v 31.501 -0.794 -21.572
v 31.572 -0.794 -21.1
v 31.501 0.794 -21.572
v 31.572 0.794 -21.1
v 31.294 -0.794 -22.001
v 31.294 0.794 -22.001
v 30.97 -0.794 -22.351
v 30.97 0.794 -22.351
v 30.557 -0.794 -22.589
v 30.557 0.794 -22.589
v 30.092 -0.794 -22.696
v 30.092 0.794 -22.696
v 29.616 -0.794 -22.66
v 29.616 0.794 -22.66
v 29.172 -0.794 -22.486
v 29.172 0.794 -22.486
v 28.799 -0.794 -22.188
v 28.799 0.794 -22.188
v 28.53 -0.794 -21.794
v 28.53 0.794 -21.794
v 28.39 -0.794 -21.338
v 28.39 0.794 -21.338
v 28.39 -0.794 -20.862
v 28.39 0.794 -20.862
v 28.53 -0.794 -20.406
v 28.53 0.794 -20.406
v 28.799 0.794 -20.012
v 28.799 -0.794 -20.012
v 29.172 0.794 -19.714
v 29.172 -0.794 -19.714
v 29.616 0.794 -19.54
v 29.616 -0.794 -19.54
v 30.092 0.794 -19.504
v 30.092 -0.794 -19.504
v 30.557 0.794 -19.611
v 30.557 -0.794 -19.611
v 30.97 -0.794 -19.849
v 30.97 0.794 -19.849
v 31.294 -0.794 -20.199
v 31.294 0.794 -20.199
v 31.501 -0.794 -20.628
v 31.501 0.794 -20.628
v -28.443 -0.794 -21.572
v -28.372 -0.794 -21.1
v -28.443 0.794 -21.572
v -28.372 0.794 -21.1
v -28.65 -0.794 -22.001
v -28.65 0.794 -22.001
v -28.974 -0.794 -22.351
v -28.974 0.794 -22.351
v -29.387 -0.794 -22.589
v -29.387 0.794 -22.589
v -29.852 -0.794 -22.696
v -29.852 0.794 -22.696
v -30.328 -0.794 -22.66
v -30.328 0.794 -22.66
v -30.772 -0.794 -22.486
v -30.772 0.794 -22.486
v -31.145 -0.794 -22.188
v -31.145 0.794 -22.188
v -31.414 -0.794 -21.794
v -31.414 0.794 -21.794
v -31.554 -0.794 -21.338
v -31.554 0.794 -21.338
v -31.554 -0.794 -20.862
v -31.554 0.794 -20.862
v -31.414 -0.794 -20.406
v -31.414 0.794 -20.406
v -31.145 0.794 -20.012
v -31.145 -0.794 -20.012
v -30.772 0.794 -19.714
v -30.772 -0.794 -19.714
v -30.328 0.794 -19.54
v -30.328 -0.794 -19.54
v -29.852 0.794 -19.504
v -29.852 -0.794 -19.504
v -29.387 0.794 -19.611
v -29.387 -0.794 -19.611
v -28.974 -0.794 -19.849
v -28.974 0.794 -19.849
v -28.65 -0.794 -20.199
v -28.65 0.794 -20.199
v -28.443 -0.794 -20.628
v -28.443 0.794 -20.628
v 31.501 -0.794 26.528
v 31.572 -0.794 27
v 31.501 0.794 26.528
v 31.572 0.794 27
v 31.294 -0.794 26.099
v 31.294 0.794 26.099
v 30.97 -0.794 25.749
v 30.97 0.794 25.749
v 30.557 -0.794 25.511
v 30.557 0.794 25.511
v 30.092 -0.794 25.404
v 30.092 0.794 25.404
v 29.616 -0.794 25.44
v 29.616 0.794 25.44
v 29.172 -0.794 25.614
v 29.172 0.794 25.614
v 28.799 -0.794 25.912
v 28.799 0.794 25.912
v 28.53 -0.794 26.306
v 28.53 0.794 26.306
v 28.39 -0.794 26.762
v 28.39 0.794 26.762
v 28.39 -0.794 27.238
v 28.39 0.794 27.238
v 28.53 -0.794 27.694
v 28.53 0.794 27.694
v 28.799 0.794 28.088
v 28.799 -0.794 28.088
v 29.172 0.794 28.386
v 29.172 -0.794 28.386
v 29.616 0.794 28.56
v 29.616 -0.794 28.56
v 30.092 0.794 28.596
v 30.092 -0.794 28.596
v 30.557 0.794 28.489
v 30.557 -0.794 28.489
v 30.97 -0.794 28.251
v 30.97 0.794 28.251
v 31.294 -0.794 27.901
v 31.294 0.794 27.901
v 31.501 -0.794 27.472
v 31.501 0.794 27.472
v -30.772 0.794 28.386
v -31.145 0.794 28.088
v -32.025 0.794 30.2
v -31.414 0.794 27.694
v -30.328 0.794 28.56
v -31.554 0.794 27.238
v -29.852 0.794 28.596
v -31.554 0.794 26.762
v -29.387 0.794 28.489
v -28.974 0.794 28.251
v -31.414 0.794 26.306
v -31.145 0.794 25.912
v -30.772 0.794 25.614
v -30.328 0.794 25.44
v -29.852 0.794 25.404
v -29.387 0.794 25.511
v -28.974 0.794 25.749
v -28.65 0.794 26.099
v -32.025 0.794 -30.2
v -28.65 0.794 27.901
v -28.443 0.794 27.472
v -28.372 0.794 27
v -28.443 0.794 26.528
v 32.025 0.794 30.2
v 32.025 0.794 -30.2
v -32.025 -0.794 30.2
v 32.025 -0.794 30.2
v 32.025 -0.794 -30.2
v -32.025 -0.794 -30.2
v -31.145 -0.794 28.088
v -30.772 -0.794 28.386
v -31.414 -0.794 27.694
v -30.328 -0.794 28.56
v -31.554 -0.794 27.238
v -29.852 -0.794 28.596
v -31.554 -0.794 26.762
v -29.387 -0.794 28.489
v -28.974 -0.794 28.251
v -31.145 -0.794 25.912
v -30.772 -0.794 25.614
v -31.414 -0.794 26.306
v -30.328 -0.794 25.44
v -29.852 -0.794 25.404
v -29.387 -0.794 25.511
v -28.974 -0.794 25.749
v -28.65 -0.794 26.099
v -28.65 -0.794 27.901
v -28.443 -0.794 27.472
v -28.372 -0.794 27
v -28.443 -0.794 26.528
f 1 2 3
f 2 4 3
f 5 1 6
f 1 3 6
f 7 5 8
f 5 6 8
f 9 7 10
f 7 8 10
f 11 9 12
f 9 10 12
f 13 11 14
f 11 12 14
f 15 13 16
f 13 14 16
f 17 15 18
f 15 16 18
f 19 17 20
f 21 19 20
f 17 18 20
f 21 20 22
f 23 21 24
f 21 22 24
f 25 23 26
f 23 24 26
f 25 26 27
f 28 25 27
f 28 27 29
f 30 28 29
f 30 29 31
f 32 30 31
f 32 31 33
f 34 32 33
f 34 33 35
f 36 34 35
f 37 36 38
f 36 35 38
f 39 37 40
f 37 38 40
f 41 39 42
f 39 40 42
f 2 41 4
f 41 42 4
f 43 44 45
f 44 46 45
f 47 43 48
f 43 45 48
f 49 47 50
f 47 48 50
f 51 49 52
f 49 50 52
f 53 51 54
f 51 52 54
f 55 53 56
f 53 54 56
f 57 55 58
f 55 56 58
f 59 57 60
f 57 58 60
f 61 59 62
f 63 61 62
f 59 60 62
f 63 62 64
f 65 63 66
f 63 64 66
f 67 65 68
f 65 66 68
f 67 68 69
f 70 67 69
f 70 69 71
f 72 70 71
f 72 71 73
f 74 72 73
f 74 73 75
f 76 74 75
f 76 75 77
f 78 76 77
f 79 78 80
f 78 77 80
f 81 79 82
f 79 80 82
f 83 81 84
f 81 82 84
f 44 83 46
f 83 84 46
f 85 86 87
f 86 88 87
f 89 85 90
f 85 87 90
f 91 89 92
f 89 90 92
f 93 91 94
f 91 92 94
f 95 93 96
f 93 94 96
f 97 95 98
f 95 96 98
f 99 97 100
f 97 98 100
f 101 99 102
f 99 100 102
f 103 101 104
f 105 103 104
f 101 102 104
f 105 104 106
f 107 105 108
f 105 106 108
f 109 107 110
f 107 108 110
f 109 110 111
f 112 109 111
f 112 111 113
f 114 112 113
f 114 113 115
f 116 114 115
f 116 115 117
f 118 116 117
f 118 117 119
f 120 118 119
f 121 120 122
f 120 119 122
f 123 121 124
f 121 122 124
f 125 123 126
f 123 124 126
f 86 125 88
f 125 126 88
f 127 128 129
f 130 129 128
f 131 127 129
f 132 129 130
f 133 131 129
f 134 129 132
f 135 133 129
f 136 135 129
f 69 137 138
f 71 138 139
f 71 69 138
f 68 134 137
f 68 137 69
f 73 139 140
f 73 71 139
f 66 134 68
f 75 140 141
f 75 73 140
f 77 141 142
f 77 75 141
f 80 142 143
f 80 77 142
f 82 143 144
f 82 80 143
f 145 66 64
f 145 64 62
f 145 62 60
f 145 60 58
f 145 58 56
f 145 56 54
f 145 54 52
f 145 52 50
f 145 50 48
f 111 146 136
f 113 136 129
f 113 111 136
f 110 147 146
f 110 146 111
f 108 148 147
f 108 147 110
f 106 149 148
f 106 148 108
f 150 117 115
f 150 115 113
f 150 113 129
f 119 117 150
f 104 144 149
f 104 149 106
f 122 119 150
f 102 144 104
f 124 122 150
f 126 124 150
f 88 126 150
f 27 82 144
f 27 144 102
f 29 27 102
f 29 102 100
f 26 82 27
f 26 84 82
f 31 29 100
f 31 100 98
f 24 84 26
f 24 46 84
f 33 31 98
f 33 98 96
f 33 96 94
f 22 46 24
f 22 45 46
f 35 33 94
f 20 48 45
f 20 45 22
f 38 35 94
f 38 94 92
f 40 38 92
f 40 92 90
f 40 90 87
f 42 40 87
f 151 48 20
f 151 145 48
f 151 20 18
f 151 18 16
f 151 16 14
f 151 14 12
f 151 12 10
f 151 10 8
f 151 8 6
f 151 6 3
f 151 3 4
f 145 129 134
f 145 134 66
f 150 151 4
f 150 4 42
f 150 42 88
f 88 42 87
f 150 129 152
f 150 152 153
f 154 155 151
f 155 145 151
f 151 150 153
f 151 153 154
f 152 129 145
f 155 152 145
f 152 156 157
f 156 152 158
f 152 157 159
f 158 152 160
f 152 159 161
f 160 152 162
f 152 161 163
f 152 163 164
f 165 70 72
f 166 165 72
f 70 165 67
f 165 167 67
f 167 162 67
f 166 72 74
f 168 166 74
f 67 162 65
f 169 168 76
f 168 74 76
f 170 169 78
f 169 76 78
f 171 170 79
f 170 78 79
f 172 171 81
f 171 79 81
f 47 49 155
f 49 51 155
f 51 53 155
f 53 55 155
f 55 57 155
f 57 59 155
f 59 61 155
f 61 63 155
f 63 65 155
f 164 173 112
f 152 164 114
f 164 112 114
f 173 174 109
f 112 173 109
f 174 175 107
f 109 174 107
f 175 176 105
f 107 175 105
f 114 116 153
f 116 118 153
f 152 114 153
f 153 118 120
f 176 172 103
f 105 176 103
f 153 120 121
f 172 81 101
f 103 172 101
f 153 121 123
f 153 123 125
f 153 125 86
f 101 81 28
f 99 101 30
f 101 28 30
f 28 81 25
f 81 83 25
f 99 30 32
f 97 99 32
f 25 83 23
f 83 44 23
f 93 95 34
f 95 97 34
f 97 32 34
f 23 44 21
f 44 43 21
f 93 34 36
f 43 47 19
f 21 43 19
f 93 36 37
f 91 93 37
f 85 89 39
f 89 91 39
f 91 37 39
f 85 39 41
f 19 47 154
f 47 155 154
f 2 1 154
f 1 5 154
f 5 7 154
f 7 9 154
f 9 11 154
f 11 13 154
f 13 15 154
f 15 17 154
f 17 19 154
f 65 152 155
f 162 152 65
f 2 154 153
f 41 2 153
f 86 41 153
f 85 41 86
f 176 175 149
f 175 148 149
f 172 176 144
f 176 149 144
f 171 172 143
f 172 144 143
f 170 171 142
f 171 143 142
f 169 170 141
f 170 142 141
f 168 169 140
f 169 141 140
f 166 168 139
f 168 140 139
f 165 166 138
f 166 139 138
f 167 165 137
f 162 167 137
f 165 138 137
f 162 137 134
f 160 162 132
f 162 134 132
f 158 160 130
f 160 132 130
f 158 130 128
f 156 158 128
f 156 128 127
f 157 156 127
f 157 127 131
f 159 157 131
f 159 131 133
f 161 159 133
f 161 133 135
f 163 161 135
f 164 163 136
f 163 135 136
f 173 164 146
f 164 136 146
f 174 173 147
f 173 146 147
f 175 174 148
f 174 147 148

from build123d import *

# Parameters (mm, degrees)
SKETCH2_W               = 64.049999916
SKETCH2_H               = 60.400000104
BOSS_EXTRUDE1_DEPTH     = 0.79375
SKETCH3_R               = 1.599999975
CUT_EXTRUDE1_DEPTH      = 1.79375
CUT_EXTRUDE1_DEPTH_BACK = 1.79375


with BuildPart() as part:
    # Sketch2 → Boss-Extrude1 (new body, symmetric)
    with BuildSketch(Plane(origin=(0, 0, 0), x_dir=(1, 0, 0), z_dir=(0, 1, 0))):
        Rectangle(SKETCH2_W, SKETCH2_H)
    extrude(amount=BOSS_EXTRUDE1_DEPTH, both=True)

    # Sketch3 → Cut-Extrude1 (cut, two sides)
    with BuildSketch(Plane(origin=(0, 0, 0), x_dir=(1, 0, 0), z_dir=(0, 1, 0))) as cut_extrude1_sk:
        with Locations((-29.972, 21.099999964)):
            Circle(SKETCH3_R)
        with Locations((29.972, 21.099999964)):
            Circle(SKETCH3_R)
        with Locations((29.972, -27.000000102)):
            Circle(SKETCH3_R)
        with Locations((-29.972, -27.000000102)):
            Circle(SKETCH3_R)
    extrude(amount=CUT_EXTRUDE1_DEPTH, mode=Mode.SUBTRACT)
    extrude(cut_extrude1_sk.sketch, amount=-CUT_EXTRUDE1_DEPTH_BACK, mode=Mode.SUBTRACT)


solid = part.part
